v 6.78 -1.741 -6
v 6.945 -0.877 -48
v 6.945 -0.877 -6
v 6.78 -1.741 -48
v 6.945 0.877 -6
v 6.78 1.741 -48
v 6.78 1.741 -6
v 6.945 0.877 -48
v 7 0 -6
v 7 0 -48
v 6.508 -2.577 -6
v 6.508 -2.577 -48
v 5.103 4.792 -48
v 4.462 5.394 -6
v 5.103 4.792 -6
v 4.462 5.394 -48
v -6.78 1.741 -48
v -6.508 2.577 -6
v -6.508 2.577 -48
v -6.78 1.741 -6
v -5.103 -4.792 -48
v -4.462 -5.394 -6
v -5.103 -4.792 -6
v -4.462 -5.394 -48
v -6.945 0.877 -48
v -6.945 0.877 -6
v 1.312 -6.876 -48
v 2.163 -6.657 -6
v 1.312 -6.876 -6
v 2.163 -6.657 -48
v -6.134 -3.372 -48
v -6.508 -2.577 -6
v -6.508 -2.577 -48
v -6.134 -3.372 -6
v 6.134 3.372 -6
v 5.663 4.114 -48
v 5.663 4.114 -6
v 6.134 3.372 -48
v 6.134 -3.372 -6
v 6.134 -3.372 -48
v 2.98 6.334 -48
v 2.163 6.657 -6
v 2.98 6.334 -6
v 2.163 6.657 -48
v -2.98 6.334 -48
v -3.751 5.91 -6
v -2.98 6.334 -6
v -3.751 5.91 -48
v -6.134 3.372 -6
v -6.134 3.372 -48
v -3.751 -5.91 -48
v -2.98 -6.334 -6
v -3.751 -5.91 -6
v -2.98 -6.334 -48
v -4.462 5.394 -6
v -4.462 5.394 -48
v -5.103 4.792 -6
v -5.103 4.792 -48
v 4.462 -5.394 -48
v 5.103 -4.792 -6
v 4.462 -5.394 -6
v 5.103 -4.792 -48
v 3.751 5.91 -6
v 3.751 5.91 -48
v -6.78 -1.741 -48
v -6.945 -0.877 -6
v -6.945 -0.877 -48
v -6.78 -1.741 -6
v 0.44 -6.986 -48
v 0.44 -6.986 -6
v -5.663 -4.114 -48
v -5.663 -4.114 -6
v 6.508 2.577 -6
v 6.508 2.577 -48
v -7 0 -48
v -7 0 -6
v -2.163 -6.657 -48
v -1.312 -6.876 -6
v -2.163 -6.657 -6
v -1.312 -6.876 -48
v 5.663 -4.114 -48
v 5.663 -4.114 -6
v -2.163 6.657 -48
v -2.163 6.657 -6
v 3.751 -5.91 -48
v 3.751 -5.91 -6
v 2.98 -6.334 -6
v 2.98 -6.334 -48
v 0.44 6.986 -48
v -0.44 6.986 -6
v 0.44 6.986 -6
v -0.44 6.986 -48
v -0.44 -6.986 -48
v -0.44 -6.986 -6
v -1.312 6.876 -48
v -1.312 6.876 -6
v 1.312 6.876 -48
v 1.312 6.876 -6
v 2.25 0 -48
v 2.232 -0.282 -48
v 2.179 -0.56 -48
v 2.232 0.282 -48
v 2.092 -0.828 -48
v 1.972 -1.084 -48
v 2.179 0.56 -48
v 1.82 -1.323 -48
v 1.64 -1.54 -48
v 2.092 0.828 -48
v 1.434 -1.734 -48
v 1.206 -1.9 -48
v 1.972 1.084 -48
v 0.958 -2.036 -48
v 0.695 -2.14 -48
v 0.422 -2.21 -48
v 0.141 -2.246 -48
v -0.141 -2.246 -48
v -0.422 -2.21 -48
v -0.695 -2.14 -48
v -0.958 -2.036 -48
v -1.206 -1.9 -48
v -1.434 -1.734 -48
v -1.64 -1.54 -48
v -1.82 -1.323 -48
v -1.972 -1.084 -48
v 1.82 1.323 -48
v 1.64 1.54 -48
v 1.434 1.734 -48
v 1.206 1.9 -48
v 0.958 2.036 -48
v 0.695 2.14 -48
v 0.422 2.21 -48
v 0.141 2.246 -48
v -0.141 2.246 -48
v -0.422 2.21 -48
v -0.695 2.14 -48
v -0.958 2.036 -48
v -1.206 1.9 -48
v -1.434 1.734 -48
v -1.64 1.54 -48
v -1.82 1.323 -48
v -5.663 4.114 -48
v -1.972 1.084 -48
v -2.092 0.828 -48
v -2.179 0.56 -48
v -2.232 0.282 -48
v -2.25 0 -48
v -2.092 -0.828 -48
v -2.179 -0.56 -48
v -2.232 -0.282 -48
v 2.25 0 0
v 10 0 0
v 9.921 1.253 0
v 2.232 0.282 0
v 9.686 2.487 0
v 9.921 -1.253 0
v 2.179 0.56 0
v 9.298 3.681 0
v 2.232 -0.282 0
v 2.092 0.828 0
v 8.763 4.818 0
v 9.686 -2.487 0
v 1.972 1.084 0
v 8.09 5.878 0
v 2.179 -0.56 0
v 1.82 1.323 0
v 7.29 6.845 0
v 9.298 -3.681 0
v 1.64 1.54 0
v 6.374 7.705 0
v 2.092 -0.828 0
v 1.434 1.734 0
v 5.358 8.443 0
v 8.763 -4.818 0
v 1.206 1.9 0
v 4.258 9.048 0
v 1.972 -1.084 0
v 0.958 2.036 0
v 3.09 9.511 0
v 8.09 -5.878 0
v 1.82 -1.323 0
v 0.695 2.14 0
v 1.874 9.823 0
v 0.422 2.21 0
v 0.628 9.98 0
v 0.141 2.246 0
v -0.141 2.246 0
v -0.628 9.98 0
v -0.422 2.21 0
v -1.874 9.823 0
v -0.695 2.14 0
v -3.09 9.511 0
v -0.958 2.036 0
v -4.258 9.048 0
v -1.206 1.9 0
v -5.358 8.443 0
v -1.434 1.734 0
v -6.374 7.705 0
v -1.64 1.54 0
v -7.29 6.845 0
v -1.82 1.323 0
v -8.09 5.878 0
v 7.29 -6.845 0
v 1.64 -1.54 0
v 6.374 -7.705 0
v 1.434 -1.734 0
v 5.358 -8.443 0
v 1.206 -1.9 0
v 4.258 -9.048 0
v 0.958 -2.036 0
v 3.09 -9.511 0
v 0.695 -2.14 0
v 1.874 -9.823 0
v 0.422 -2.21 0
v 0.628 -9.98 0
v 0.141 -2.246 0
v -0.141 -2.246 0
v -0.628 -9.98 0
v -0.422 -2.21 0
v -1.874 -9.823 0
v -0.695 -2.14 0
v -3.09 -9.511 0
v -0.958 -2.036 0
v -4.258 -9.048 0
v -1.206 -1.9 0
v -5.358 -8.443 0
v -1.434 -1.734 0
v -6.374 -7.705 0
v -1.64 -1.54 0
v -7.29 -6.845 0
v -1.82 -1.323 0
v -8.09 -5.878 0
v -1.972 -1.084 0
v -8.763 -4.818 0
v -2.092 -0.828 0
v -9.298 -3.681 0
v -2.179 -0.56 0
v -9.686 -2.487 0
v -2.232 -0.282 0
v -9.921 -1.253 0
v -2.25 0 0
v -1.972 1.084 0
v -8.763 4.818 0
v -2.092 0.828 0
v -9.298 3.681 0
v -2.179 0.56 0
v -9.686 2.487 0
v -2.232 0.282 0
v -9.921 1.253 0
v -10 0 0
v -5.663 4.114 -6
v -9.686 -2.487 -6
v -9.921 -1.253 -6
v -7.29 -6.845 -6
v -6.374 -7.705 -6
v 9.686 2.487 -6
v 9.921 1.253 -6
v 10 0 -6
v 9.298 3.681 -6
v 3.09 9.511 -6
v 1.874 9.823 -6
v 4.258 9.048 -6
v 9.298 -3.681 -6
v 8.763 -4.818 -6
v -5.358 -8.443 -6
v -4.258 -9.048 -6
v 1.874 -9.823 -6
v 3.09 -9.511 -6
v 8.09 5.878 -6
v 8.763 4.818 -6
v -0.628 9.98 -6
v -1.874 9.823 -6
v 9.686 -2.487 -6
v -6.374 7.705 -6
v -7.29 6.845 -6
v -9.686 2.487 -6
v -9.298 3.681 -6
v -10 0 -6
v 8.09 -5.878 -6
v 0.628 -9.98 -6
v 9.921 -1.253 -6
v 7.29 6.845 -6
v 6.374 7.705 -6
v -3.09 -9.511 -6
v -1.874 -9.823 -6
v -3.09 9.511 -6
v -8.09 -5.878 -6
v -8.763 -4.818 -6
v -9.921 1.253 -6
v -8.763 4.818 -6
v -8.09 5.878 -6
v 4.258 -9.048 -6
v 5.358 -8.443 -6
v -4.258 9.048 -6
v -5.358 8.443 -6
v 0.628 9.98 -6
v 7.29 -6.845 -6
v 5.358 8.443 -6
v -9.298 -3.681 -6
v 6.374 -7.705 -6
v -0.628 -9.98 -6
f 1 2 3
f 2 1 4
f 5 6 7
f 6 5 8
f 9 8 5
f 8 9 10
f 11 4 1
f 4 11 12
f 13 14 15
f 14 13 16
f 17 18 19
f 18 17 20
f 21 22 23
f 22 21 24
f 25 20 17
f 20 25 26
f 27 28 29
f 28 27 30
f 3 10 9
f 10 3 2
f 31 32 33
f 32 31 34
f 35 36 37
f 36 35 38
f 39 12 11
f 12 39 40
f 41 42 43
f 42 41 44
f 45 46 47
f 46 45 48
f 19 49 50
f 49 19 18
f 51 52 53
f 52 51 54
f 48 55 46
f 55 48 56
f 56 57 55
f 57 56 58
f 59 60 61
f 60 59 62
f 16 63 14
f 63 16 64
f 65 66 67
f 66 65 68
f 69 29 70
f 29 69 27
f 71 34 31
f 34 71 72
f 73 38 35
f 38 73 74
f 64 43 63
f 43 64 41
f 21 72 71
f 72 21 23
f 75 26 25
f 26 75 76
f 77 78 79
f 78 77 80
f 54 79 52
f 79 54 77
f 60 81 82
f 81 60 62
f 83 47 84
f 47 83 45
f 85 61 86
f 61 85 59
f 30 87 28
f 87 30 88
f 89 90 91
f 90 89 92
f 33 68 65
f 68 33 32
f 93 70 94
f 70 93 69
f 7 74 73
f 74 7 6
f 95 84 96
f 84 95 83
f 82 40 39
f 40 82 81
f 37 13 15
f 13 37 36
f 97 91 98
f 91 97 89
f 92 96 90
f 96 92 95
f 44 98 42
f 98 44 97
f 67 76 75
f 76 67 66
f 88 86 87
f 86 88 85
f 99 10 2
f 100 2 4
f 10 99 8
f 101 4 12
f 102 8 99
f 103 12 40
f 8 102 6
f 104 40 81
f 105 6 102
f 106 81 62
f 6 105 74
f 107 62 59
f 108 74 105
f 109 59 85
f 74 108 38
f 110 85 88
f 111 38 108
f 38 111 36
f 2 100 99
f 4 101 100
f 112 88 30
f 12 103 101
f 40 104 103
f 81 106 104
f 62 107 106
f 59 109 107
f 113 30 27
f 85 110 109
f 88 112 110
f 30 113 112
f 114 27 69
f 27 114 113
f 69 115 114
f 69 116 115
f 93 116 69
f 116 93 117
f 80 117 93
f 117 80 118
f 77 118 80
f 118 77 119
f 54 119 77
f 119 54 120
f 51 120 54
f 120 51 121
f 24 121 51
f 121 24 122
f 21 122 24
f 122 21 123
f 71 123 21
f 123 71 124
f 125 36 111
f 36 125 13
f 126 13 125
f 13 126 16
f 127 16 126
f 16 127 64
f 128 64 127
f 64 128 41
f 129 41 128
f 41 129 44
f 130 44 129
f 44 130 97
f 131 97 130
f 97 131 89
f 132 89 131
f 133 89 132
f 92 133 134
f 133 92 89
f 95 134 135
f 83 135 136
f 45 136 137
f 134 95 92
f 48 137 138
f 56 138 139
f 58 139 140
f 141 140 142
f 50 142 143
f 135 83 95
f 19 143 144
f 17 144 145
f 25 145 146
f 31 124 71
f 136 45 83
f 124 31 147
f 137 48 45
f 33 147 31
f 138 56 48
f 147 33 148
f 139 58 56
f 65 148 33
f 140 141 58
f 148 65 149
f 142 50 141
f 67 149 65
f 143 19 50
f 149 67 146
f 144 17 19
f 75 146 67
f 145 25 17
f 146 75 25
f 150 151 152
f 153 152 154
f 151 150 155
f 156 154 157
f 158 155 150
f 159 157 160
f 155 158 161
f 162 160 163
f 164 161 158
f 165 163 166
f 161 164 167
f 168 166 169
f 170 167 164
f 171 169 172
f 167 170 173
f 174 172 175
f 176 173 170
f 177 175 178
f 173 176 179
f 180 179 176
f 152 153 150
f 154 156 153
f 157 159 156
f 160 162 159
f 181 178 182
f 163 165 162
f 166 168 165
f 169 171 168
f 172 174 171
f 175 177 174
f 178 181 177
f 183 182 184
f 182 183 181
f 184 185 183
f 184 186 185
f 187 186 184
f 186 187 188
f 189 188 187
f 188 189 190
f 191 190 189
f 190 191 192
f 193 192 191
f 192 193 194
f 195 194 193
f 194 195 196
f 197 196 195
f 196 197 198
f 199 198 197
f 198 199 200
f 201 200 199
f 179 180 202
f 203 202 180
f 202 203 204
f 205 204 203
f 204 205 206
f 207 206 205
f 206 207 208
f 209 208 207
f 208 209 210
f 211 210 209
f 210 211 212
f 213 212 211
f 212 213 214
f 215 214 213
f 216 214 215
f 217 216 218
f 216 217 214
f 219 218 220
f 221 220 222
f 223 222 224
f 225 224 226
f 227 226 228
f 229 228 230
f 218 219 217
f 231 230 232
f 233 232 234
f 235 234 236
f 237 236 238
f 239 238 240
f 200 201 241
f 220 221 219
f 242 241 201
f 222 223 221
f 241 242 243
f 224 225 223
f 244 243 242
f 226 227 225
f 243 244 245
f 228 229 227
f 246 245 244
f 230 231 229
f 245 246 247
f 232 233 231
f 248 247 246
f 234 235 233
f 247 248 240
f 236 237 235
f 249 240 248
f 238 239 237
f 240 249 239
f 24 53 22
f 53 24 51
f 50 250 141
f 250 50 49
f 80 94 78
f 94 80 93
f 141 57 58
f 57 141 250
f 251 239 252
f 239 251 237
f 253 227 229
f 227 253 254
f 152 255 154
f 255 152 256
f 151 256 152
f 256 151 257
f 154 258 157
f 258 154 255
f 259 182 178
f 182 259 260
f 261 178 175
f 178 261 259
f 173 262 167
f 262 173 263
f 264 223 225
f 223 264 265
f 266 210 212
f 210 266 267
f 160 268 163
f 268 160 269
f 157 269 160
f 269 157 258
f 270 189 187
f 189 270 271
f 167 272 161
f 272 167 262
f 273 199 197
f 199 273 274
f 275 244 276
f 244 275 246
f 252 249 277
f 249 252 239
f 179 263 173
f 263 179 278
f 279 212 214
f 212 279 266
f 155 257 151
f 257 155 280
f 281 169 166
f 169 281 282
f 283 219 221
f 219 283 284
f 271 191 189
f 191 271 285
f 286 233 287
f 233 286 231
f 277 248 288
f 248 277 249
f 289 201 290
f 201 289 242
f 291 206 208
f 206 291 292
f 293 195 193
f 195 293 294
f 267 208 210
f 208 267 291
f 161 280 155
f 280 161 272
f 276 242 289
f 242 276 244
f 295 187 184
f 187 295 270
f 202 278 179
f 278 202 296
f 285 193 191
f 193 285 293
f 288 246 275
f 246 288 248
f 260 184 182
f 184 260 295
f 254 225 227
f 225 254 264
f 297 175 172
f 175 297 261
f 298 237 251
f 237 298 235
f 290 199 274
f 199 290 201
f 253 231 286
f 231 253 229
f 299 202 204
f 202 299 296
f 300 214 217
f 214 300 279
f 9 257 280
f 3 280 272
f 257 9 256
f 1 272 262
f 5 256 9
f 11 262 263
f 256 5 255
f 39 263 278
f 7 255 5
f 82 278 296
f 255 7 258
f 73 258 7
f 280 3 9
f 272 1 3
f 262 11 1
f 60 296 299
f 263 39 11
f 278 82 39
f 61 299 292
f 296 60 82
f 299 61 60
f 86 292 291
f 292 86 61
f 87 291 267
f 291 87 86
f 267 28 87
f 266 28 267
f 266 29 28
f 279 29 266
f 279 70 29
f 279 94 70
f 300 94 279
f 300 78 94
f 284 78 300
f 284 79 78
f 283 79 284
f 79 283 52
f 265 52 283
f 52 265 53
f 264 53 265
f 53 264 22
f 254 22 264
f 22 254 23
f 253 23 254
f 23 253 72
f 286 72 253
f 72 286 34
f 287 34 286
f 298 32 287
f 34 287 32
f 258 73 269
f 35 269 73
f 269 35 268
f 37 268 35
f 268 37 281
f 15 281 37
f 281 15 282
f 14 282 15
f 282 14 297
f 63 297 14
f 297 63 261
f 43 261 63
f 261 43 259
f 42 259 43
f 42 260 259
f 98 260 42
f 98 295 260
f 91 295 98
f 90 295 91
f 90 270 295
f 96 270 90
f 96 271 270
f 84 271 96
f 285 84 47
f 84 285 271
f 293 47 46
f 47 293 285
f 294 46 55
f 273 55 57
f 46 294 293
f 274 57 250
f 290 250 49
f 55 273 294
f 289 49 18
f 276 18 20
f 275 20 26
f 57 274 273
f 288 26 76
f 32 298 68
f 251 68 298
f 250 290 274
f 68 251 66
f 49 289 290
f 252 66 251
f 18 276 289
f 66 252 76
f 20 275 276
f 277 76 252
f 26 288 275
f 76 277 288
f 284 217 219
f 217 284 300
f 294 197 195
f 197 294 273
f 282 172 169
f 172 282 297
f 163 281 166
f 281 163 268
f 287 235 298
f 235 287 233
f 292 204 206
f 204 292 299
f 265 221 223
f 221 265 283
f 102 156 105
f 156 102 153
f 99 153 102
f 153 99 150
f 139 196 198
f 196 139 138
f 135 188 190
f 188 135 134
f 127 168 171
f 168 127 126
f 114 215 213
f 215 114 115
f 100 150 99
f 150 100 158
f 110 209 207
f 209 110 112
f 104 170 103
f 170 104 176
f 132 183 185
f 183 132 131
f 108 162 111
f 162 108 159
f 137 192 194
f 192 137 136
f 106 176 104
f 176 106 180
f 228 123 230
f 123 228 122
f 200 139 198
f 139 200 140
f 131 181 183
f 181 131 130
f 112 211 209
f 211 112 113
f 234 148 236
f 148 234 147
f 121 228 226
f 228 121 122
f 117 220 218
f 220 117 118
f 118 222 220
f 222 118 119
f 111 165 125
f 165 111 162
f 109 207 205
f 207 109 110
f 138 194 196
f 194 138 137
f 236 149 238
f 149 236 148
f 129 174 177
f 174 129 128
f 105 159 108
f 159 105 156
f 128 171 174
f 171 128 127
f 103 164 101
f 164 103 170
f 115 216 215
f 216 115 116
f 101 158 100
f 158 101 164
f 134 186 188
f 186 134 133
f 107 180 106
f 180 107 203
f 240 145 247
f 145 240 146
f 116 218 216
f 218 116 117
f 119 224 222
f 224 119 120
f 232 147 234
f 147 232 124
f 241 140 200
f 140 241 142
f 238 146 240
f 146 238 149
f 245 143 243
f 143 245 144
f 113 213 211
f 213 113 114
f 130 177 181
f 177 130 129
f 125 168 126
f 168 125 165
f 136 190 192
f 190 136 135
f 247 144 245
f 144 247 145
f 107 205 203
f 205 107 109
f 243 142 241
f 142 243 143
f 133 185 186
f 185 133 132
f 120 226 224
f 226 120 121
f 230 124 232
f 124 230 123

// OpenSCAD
$fn = 50;


difference() {
	union() {
		translate(v = [0, 0, -48.0000000000]) {
			cylinder(h = 48, r = 7.0000000000);
		}
		translate(v = [0, 0, -6.0000000000]) {
			cylinder(h = 6, r = 10.0000000000);
		}
	}
	union() {
		#translate(v = [0, 0, -48]) {
			cylinder(h = 48, r = 2.2500000000);
		}
	}
}
